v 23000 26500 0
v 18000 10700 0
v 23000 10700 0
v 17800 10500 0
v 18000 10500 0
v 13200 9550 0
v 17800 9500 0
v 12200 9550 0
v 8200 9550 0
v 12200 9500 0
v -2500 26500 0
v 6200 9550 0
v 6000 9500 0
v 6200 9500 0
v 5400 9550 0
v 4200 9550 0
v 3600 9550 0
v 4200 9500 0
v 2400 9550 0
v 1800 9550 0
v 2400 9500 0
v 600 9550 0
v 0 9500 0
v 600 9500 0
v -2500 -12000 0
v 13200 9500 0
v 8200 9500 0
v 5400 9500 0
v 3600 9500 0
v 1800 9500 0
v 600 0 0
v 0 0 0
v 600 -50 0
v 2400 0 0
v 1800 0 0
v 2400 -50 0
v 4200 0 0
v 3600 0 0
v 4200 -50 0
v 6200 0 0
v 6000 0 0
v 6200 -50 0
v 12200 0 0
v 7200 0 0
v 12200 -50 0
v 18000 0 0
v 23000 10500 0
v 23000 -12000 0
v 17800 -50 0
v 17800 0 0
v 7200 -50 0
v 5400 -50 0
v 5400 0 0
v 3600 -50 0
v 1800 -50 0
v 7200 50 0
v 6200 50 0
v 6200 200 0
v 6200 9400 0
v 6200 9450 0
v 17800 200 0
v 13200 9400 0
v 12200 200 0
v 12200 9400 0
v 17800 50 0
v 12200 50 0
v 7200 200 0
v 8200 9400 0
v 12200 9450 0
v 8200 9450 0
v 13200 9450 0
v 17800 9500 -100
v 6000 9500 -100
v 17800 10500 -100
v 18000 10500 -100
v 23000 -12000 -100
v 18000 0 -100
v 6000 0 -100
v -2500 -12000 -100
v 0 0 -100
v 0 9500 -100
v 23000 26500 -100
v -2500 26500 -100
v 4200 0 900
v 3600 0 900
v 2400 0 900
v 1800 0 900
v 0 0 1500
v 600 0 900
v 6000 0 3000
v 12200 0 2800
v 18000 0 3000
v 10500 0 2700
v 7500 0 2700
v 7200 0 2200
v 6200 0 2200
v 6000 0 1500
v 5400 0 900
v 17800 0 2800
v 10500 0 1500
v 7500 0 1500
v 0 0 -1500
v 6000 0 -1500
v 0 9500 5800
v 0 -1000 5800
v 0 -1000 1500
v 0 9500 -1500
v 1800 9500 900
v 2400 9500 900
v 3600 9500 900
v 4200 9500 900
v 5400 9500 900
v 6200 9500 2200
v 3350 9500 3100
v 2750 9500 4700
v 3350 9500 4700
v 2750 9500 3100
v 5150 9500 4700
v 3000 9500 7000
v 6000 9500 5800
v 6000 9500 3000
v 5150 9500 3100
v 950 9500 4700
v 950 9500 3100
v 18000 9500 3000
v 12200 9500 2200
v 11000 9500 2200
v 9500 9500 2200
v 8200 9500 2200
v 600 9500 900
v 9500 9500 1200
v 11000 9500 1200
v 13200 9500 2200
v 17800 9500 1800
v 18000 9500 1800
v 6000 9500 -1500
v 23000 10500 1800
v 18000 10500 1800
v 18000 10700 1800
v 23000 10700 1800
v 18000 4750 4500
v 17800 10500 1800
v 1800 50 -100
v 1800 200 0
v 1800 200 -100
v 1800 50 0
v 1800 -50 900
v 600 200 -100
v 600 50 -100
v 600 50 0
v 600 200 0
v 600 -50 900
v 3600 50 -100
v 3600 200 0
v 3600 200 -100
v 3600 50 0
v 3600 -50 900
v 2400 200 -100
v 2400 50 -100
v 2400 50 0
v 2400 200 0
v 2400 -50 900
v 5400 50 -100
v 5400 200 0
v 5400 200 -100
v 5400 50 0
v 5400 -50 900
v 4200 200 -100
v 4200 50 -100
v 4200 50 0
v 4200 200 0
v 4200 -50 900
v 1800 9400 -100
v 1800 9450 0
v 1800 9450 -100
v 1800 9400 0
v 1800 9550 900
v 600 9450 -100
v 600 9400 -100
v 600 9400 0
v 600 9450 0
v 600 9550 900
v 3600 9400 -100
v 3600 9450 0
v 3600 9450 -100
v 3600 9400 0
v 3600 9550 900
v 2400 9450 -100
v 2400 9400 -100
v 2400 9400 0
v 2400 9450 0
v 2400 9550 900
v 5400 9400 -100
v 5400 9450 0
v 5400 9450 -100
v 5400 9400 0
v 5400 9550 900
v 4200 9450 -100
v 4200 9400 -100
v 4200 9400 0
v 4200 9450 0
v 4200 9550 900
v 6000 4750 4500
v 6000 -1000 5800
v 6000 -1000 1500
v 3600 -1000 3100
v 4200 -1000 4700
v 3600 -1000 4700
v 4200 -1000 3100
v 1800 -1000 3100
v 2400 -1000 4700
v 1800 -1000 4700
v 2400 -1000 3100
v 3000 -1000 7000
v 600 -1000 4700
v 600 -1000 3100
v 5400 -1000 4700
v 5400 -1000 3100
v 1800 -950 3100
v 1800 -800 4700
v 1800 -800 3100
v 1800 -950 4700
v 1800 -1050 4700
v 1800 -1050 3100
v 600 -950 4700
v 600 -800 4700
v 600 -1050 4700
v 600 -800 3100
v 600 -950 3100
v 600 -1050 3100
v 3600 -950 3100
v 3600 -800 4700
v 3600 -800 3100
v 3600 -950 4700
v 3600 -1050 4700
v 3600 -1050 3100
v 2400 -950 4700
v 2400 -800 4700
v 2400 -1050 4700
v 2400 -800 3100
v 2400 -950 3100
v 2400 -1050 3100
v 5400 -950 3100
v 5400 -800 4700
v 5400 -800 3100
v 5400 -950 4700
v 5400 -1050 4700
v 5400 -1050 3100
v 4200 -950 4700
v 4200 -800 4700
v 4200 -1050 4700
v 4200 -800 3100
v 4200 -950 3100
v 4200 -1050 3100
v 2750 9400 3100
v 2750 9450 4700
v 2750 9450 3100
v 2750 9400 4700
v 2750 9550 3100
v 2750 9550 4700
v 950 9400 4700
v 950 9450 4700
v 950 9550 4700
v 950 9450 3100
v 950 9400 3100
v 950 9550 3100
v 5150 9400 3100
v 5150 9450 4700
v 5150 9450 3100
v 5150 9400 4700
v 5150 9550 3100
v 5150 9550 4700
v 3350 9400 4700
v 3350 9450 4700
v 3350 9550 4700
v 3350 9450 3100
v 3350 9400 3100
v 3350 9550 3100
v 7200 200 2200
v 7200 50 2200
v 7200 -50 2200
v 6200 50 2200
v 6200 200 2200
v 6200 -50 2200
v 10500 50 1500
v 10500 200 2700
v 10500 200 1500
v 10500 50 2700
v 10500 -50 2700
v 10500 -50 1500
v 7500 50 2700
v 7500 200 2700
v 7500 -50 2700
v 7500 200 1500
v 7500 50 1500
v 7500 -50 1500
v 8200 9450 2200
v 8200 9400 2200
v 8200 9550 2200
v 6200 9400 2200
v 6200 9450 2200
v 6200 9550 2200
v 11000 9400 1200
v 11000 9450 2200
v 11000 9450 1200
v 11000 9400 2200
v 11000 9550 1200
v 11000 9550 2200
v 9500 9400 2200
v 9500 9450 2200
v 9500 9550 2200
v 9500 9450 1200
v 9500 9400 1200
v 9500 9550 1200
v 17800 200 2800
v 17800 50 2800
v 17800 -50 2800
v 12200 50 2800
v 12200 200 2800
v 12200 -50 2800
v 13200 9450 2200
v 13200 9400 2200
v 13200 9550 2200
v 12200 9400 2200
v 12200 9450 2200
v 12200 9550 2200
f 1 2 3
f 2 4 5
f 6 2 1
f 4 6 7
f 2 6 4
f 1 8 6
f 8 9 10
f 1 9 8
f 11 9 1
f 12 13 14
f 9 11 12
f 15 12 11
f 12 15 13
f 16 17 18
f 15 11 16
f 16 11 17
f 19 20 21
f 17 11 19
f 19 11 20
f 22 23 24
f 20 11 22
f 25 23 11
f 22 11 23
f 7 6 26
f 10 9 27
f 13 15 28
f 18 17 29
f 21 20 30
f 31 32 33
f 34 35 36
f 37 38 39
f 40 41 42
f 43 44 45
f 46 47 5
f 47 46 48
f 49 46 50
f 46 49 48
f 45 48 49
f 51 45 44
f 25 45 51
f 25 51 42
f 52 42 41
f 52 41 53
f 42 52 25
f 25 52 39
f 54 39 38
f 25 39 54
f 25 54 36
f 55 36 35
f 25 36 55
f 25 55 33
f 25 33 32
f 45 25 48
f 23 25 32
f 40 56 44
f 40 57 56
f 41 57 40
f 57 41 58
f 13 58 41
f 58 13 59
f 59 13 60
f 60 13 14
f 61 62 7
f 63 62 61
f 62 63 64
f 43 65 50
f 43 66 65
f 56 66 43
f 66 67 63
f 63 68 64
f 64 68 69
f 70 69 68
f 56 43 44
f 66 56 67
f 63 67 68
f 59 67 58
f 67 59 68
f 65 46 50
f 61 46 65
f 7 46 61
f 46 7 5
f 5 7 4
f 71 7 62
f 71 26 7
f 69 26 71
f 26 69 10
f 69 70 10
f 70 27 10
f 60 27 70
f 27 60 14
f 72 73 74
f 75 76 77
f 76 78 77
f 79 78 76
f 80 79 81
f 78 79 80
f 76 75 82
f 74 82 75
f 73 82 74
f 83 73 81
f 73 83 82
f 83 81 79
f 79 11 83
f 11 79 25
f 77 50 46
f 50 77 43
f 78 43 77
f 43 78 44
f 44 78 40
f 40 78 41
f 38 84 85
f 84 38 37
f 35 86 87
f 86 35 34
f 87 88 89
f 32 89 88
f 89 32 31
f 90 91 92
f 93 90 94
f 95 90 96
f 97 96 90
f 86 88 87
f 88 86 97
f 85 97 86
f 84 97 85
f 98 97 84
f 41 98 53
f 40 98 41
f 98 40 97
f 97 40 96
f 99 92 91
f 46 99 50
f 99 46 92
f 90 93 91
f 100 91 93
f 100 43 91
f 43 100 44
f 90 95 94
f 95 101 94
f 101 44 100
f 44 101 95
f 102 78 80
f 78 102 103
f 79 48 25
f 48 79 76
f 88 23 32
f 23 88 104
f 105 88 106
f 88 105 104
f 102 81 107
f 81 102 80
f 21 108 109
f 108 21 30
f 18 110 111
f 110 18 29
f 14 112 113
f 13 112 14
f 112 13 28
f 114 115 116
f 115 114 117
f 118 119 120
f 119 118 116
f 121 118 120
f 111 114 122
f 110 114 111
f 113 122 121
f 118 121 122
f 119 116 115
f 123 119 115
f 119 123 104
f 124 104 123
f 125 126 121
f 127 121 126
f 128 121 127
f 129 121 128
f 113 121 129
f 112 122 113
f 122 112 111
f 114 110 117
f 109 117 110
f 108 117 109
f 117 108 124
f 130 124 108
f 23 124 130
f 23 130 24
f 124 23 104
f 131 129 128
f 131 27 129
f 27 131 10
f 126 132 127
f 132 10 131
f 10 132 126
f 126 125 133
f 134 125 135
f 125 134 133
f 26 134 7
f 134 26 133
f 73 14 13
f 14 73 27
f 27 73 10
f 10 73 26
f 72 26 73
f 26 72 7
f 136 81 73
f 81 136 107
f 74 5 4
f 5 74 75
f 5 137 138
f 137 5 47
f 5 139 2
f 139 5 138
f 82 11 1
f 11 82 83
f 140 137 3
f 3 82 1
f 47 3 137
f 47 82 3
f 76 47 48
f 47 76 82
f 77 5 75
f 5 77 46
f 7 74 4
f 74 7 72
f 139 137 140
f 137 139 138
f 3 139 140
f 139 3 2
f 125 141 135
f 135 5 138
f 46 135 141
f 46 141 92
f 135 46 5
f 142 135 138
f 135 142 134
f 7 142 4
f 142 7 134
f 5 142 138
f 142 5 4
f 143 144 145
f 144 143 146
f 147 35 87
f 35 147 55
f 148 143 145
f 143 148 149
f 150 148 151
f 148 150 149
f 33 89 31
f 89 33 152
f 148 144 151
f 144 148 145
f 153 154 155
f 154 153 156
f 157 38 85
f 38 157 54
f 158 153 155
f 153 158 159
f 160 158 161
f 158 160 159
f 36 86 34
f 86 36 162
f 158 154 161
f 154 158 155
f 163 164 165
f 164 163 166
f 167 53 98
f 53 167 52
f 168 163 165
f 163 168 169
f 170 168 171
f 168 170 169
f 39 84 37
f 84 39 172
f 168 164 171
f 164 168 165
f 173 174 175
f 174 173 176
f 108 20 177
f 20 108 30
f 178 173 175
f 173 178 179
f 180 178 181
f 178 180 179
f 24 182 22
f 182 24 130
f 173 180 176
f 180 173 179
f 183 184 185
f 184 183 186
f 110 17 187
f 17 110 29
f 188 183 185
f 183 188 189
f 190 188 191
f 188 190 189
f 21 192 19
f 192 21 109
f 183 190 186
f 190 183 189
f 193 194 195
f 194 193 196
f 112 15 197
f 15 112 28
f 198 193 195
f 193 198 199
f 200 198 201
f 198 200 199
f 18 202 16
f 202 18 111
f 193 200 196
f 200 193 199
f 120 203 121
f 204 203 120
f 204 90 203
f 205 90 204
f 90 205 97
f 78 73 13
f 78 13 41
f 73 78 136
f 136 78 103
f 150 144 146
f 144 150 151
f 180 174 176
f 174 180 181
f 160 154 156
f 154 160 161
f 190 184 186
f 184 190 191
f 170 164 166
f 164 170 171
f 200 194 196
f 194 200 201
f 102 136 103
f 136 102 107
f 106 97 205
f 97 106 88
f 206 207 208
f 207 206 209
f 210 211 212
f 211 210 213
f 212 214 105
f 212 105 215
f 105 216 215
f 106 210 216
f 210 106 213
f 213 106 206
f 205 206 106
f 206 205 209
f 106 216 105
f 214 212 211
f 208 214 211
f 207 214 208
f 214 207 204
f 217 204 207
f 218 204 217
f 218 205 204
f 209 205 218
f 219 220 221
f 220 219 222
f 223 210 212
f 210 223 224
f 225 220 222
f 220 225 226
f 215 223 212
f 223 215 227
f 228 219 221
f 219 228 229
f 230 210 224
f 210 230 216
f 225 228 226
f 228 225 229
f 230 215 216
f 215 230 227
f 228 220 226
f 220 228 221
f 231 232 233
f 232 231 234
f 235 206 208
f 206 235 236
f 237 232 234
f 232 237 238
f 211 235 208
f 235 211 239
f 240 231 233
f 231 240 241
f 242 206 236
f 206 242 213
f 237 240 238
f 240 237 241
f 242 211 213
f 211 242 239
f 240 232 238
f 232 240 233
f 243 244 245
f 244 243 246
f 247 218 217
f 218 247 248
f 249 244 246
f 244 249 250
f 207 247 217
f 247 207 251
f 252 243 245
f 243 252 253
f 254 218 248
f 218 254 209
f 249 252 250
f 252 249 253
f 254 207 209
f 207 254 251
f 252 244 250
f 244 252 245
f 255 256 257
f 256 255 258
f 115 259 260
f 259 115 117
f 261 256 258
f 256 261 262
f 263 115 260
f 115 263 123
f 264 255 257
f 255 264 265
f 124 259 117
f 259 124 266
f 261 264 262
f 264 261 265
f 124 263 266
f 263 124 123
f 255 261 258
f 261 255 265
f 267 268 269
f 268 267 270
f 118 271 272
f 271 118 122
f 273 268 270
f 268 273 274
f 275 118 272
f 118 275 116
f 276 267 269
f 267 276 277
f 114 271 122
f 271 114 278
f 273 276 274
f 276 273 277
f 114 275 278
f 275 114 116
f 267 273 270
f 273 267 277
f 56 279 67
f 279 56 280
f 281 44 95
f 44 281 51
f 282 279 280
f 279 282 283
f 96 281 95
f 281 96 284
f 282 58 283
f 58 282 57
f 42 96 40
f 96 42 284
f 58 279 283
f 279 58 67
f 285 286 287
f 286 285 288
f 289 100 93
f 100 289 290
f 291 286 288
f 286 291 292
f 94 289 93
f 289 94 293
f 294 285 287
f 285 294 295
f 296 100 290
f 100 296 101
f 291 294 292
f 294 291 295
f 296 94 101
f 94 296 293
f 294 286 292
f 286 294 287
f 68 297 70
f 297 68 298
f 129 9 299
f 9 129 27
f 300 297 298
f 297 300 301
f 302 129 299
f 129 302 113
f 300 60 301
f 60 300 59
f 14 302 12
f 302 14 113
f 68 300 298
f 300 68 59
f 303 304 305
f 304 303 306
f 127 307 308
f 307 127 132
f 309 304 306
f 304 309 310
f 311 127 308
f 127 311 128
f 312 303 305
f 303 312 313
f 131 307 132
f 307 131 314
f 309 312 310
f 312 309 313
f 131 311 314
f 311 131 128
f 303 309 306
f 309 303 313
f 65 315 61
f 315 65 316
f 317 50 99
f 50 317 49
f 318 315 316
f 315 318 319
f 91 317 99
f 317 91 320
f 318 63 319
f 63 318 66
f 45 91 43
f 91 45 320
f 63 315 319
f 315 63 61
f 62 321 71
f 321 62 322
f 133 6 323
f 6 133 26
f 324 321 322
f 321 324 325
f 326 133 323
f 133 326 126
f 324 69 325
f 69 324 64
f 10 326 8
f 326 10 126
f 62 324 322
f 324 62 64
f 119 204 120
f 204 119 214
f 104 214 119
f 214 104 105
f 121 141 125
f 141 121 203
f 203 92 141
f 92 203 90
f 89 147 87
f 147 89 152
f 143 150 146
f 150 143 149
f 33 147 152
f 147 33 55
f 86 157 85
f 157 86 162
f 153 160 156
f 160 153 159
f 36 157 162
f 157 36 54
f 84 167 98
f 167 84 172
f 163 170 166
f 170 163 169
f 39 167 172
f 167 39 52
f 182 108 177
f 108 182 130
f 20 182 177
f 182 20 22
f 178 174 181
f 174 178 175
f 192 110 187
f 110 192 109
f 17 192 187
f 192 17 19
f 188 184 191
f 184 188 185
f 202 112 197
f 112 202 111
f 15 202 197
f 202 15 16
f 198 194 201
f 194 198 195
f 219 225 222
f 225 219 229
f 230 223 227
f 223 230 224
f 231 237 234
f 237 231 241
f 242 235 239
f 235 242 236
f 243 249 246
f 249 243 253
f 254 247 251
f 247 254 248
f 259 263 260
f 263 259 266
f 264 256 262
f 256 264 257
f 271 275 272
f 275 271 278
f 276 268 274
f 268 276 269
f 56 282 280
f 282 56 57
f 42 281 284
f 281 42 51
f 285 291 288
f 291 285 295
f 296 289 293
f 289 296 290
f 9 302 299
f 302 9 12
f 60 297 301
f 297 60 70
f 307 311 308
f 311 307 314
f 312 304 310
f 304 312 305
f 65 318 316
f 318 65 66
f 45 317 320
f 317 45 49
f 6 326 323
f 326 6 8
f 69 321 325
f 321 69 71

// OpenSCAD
// Basic House - Trisplit Design
$fn = 50;

// ========================================
// CONFIGURATION & CONSTANTS
// ========================================

// House dimensions (FULL SIZE in mm)
house_width = 20000;  // 20 meters total
house_depth = 9500;   // 9.5 meters depth
house_height = 3000;  // Ground floor height
second_floor_height = 2800; // Second floor height
basement_height = 1500; // house_height/2

// Section widths (each 6 meters)
section_width = 6000;
left_section_x = -section_width;
middle_section_x = 0;
garage_section_x = section_width;

// Overhang configuration
master_bedroom_overhang = 1000; // 1 meter forward
overhang_start_height = house_height/2; // Upper half of ground floor + second floor

// Window dimensions
window_width = 1200;
window_depth = 300;
window_pane_depth = 100;
basement_window_height = 1000;
ground_floor_window_height = 1200;
master_bedroom_window_height = 1600;
back_bedroom_window_width = 1800; // Wider windows for back bedrooms
living_room_window_width = 3000;
living_room_window_height = 1200;

// Door dimensions  
door_width = 1000;
door_height = 2200;
door_depth = 300;
door_pane_depth = 100;
sliding_door_width = 2000; // Twice as wide as front door
kitchen_window_width = 1500;
kitchen_window_height = 1000;

// Colors
grass_color = [0.424, 0.482, 0.188]; // 6C7B30
concrete_color = [0.643, 0.718, 0.741]; // A4B7BD
basement_color = [0.5, 0.5, 0.5];
house_color = [0.435, 0.616, 0.702]; // 6F9DB3
living_room_color = [0.545, 0.624, 0.627]; // 8B9FA0
master_bedroom_color = [0.514, 0.686, 0.737]; // 83AFBC
garage_color = [0.9, 0.9, 0.9];
garage_door_color = [0.8, 0.8, 0.773]; // CCCCC5
window_color = [0.1, 0.1, 0.1];
door_color = [0.153, 0.243, 0.243]; // 273E3E
roof_color = [0.722, 0.745, 0.745]; // B8BEBE
main_roof_color = [0.722, 0.745, 0.745]; // B8BEBE
fence_color = [0.6, 0.4, 0.2]; // Brown wood fence
garden_dirt_color = [0.4, 0.3, 0.2]; // Brown dirt for garden

// Window positions (X coordinates relative to left section)
basement_window_x_positions = [-5400, -3600, -1800];
master_bedroom_front_window_x_positions = [-5400, -3600, -1800];
master_bedroom_back_window_x_positions = [-5050, -2650]; // Two bedrooms across the hall - shifted left 2 meters

// House origin offset
house_origin_x = 6000;

// ========================================
// REUSABLE MODULES
// ========================================

module create_window_opening(x, y, z, w, d, h) {
    translate([x, y, z])
    cube([w, d, h]);
}

module create_window_pane(x, y, z, w, d, h) {
    color(window_color)
    translate([x, y, z])
    cube([w, d, h]);
}

module create_door_opening(x, y, z, w, d, h) {
    translate([x, y, z])
    cube([w, d, h]);
}

module create_door_pane(x, y, z, w, d, h) {
    color(door_color)
    translate([x, y, z])
    cube([w, d, h]);
}

module basement_windows() {
    // Front window openings
    for (x = basement_window_x_positions) {
        create_window_opening(x, -100, -100, window_width, window_depth, basement_window_height);
    }
    // Back window openings (straight across from front)
    for (x = basement_window_x_positions) {
        create_window_opening(x, house_depth - 100, -100, window_width, window_depth, basement_window_height);
    }
}

module basement_window_panes() {
    // Front window panes
    for (x = basement_window_x_positions) {
        create_window_pane(x, -50, -100, window_width, window_pane_depth, basement_window_height);
    }
    // Back window panes (straight across from front)
    for (x = basement_window_x_positions) {
        create_window_pane(x, house_depth - 50, -100, window_width, window_pane_depth, basement_window_height);
    }
}

module master_bedroom_window_openings() {
    // Front windows (master bedroom)
    for (x = master_bedroom_front_window_x_positions) {
        create_window_opening(x, -1100, house_height + 100, window_width, window_depth, master_bedroom_window_height);
    }
    // Back windows (bedrooms across the hall) - wider
    for (x = master_bedroom_back_window_x_positions) {
        create_window_opening(x, house_depth - 100, house_height + 100, back_bedroom_window_width, window_depth, master_bedroom_window_height);
    }
}

module master_bedroom_window_panes() {
    // Front windows (master bedroom)
    for (x = master_bedroom_front_window_x_positions) {
        create_window_pane(x, -1050, house_height + 100, window_width, window_pane_depth, master_bedroom_window_height);
    }
    // Back windows (bedrooms across the hall) - wider
    for (x = master_bedroom_back_window_x_positions) {
        create_window_pane(x, house_depth - 50, house_height + 100, back_bedroom_window_width, window_pane_depth, master_bedroom_window_height);
    }
}

// ========================================
// LANDSCAPING MODULES  
// ========================================

module lawn_areas() {
    color(grass_color) {
        // Left side lawn (in front of left section) - extended to 12m from front door
        translate([-2500, -12000, -100])
        cube([8500, 12000, 100]);
        
        // Left side of house (along the side) - extended
        translate([-2500, 0, -100])
        cube([2500, 9500, 100]);
        
        // Front of middle section lawn - extended to 12m from front door
        translate([6000, -12000, -100])
        cube([6000, 12000, 100]);
        
        // Back yard lawn (behind house) - with gap for walkway
        translate([-2500, 9500, -100])
        cube([8700, 1000, 100]); // Left side grass (before walkway)
        
        // Grass between green door and concrete walkway (fills the hole)
        translate([6200, 9500, -100])
        cube([6000, 1000, 100]);
        
        // Back yard lawn continued (after walkway) - extended to 16m from sliding door
        translate([-2500, 10500, -100])
        cube([20500, 16000, 100]); // Extended back yard to 16m depth
    }
}

module concrete_areas() {
    color(concrete_color) {
        // Driveway/garage area (in front of garage) - extended to match grass
        translate([12000, -12000, -100])
        cube([6000, 12000, 100]);
        
        // Right side concrete area (in front) - extended to match grass
        translate([18000, -12000, -100])
        cube([5000, 12000, 100]);
        
        // Right side of house (along the side)
        translate([18000, 0, -100])
        cube([5000, 9500, 100]);
        
        // 1 meter sidewalk to garage door (extends back from concrete)
        translate([18000, 9500, -100])
        cube([5000, 1000, 100]);
        
        // Walkway from gate to green door (horizontal concrete path)
        translate([12200, 9500, -100])
        cube([5600, 1000, 100]); // From green door to gate
    }
}

// ========================================
// HOUSE STRUCTURE MODULES
// ========================================

module basement_section() {
    color(basement_color)
    difference() {
        translate([left_section_x, 0, -basement_height])
        cube([section_width, house_depth, basement_height]);
        
        basement_windows();
    }
}

module left_section_structure() {
    difference() {
        union() {
            // Ground floor - lower portion (stays in place) - living room color
            color(living_room_color)
            translate([left_section_x, 0, 0])
            cube([section_width, house_depth, house_height/2]);
            
            // Ground floor - upper portion (extends 1m forward) - master bedroom color
            color(master_bedroom_color)
            translate([left_section_x, -master_bedroom_overhang, house_height/2])
            cube([section_width, house_depth + master_bedroom_overhang, house_height/2]);
            
            // Second floor (master bedroom extends 1m forward) - master bedroom color
            color(master_bedroom_color)
            translate([left_section_x, -master_bedroom_overhang, house_height])
            cube([section_width, house_depth + master_bedroom_overhang, second_floor_height]);
        }
        
        master_bedroom_window_openings();
    }
}

module middle_section_structure() {
    color(living_room_color)
    difference() {
        translate([middle_section_x, 0, 0])
        cube([section_width, house_depth, house_height]);
        
        // Front door opening
        create_door_opening(200, -100, 0, door_width, door_depth, door_height);
        
        // Living room window opening (front)
        create_window_opening(1500, -100, 1500, living_room_window_width, window_depth, living_room_window_height);
        
        // Sliding door opening (back - straight across from front door)
        create_door_opening(200, house_depth - 100, 0, sliding_door_width, door_depth, door_height);
        
        // Kitchen window opening (back - moved 1m east)
        create_window_opening(3500, house_depth - 100, 1200, kitchen_window_width, window_depth, kitchen_window_height);
    }
}

module garage_section() {
    color(garage_color)
    translate([garage_section_x, 0, 0])
    difference() {
        cube([section_width, house_depth, house_height]);
        
        // Garage door opening (front)
        translate([200, -100, 0])
        cube([5600, 300, house_height - 200]);
        
        // Back door opening (against kitchen wall)
        create_door_opening(200, house_depth - 100, 0, door_width, door_depth, door_height);
    }
}

module roof_system() {
    // Left roof - front to back (peaked) for master bedroom section
    color(roof_color)
    translate([left_section_x, house_depth, house_height + second_floor_height])
    rotate([90, 0, 0])
    linear_extrude(height = house_depth + master_bedroom_overhang)
    polygon([[0, 0], [section_width, 0], [section_width/2, 1200]]);
    
    // Main roof - left to right (peaked, covers middle and garage)
    color(main_roof_color)
    translate([middle_section_x, 0, house_height])
    rotate([90, 0, 90])
    linear_extrude(height = section_width * 2)
    polygon([[0, 0], [house_depth, 0], [house_depth/2, 1500]]);
}

// ========================================
// DOORS & WINDOWS
// ========================================

module doors_and_windows() {
    // Front door
    create_door_pane(200, -50, 0, door_width, door_pane_depth, door_height);
    
    // Living room window (front)
    create_window_pane(1500, -50, 1500, living_room_window_width, window_pane_depth, living_room_window_height);
    
    // Sliding door (back - glass panels)
    color(window_color)
    create_window_pane(200, house_depth - 50, 0, sliding_door_width, door_pane_depth, door_height);
    
    // Kitchen window (back - moved 1m east)
    create_window_pane(3500, house_depth - 50, 1200, kitchen_window_width, window_pane_depth, kitchen_window_height);
    
    // Garage door (front)
    color(garage_door_color)
    translate([garage_section_x + 200, -50, 0])
    cube([5600, door_pane_depth, house_height - 200]);
    
    // Garage back door (against kitchen wall)
    create_door_pane(garage_section_x + 200, house_depth - 50, 0, door_width, door_pane_depth, door_height);
    
    // Basement window panes
    basement_window_panes();
    
    // Master bedroom window panes
    master_bedroom_window_panes();
}

// ========================================
// FENCE MODULE
// ========================================

module wood_fence() {
    color(fence_color) {
        // Main fence across back of sidewalk (pushed back 1 meter)
        translate([18000, 10500, 0])
        cube([5000, 200, 1800]); // 200mm thick, 1.8m tall fence
        
        // Short fence connecting island fence to house (1 meter)
        translate([17800, 9500, 0])
        cube([200, 1000, 1800]); // Perpendicular connector fence
    }
}

// ========================================
// GARDEN MODULE
// ========================================

module garden_area() {
    color(garden_dirt_color) {
        // Garden dirt on right side behind fence (from fence to back of property)
        translate([18000, 10500, -100])
        cube([5000, 16000, 100]); // Extended to match back yard depth
    }
}

// ========================================
// MAIN ASSEMBLY
// ========================================

// Landscaping
lawn_areas();
concrete_areas();
wood_fence();
garden_area();

// Main house structure (with origin offset)
translate([house_origin_x, 0, 0])
union() {
    basement_section();
    left_section_structure();
    middle_section_structure();
    garage_section();
    roof_system();
    doors_and_windows();
}
